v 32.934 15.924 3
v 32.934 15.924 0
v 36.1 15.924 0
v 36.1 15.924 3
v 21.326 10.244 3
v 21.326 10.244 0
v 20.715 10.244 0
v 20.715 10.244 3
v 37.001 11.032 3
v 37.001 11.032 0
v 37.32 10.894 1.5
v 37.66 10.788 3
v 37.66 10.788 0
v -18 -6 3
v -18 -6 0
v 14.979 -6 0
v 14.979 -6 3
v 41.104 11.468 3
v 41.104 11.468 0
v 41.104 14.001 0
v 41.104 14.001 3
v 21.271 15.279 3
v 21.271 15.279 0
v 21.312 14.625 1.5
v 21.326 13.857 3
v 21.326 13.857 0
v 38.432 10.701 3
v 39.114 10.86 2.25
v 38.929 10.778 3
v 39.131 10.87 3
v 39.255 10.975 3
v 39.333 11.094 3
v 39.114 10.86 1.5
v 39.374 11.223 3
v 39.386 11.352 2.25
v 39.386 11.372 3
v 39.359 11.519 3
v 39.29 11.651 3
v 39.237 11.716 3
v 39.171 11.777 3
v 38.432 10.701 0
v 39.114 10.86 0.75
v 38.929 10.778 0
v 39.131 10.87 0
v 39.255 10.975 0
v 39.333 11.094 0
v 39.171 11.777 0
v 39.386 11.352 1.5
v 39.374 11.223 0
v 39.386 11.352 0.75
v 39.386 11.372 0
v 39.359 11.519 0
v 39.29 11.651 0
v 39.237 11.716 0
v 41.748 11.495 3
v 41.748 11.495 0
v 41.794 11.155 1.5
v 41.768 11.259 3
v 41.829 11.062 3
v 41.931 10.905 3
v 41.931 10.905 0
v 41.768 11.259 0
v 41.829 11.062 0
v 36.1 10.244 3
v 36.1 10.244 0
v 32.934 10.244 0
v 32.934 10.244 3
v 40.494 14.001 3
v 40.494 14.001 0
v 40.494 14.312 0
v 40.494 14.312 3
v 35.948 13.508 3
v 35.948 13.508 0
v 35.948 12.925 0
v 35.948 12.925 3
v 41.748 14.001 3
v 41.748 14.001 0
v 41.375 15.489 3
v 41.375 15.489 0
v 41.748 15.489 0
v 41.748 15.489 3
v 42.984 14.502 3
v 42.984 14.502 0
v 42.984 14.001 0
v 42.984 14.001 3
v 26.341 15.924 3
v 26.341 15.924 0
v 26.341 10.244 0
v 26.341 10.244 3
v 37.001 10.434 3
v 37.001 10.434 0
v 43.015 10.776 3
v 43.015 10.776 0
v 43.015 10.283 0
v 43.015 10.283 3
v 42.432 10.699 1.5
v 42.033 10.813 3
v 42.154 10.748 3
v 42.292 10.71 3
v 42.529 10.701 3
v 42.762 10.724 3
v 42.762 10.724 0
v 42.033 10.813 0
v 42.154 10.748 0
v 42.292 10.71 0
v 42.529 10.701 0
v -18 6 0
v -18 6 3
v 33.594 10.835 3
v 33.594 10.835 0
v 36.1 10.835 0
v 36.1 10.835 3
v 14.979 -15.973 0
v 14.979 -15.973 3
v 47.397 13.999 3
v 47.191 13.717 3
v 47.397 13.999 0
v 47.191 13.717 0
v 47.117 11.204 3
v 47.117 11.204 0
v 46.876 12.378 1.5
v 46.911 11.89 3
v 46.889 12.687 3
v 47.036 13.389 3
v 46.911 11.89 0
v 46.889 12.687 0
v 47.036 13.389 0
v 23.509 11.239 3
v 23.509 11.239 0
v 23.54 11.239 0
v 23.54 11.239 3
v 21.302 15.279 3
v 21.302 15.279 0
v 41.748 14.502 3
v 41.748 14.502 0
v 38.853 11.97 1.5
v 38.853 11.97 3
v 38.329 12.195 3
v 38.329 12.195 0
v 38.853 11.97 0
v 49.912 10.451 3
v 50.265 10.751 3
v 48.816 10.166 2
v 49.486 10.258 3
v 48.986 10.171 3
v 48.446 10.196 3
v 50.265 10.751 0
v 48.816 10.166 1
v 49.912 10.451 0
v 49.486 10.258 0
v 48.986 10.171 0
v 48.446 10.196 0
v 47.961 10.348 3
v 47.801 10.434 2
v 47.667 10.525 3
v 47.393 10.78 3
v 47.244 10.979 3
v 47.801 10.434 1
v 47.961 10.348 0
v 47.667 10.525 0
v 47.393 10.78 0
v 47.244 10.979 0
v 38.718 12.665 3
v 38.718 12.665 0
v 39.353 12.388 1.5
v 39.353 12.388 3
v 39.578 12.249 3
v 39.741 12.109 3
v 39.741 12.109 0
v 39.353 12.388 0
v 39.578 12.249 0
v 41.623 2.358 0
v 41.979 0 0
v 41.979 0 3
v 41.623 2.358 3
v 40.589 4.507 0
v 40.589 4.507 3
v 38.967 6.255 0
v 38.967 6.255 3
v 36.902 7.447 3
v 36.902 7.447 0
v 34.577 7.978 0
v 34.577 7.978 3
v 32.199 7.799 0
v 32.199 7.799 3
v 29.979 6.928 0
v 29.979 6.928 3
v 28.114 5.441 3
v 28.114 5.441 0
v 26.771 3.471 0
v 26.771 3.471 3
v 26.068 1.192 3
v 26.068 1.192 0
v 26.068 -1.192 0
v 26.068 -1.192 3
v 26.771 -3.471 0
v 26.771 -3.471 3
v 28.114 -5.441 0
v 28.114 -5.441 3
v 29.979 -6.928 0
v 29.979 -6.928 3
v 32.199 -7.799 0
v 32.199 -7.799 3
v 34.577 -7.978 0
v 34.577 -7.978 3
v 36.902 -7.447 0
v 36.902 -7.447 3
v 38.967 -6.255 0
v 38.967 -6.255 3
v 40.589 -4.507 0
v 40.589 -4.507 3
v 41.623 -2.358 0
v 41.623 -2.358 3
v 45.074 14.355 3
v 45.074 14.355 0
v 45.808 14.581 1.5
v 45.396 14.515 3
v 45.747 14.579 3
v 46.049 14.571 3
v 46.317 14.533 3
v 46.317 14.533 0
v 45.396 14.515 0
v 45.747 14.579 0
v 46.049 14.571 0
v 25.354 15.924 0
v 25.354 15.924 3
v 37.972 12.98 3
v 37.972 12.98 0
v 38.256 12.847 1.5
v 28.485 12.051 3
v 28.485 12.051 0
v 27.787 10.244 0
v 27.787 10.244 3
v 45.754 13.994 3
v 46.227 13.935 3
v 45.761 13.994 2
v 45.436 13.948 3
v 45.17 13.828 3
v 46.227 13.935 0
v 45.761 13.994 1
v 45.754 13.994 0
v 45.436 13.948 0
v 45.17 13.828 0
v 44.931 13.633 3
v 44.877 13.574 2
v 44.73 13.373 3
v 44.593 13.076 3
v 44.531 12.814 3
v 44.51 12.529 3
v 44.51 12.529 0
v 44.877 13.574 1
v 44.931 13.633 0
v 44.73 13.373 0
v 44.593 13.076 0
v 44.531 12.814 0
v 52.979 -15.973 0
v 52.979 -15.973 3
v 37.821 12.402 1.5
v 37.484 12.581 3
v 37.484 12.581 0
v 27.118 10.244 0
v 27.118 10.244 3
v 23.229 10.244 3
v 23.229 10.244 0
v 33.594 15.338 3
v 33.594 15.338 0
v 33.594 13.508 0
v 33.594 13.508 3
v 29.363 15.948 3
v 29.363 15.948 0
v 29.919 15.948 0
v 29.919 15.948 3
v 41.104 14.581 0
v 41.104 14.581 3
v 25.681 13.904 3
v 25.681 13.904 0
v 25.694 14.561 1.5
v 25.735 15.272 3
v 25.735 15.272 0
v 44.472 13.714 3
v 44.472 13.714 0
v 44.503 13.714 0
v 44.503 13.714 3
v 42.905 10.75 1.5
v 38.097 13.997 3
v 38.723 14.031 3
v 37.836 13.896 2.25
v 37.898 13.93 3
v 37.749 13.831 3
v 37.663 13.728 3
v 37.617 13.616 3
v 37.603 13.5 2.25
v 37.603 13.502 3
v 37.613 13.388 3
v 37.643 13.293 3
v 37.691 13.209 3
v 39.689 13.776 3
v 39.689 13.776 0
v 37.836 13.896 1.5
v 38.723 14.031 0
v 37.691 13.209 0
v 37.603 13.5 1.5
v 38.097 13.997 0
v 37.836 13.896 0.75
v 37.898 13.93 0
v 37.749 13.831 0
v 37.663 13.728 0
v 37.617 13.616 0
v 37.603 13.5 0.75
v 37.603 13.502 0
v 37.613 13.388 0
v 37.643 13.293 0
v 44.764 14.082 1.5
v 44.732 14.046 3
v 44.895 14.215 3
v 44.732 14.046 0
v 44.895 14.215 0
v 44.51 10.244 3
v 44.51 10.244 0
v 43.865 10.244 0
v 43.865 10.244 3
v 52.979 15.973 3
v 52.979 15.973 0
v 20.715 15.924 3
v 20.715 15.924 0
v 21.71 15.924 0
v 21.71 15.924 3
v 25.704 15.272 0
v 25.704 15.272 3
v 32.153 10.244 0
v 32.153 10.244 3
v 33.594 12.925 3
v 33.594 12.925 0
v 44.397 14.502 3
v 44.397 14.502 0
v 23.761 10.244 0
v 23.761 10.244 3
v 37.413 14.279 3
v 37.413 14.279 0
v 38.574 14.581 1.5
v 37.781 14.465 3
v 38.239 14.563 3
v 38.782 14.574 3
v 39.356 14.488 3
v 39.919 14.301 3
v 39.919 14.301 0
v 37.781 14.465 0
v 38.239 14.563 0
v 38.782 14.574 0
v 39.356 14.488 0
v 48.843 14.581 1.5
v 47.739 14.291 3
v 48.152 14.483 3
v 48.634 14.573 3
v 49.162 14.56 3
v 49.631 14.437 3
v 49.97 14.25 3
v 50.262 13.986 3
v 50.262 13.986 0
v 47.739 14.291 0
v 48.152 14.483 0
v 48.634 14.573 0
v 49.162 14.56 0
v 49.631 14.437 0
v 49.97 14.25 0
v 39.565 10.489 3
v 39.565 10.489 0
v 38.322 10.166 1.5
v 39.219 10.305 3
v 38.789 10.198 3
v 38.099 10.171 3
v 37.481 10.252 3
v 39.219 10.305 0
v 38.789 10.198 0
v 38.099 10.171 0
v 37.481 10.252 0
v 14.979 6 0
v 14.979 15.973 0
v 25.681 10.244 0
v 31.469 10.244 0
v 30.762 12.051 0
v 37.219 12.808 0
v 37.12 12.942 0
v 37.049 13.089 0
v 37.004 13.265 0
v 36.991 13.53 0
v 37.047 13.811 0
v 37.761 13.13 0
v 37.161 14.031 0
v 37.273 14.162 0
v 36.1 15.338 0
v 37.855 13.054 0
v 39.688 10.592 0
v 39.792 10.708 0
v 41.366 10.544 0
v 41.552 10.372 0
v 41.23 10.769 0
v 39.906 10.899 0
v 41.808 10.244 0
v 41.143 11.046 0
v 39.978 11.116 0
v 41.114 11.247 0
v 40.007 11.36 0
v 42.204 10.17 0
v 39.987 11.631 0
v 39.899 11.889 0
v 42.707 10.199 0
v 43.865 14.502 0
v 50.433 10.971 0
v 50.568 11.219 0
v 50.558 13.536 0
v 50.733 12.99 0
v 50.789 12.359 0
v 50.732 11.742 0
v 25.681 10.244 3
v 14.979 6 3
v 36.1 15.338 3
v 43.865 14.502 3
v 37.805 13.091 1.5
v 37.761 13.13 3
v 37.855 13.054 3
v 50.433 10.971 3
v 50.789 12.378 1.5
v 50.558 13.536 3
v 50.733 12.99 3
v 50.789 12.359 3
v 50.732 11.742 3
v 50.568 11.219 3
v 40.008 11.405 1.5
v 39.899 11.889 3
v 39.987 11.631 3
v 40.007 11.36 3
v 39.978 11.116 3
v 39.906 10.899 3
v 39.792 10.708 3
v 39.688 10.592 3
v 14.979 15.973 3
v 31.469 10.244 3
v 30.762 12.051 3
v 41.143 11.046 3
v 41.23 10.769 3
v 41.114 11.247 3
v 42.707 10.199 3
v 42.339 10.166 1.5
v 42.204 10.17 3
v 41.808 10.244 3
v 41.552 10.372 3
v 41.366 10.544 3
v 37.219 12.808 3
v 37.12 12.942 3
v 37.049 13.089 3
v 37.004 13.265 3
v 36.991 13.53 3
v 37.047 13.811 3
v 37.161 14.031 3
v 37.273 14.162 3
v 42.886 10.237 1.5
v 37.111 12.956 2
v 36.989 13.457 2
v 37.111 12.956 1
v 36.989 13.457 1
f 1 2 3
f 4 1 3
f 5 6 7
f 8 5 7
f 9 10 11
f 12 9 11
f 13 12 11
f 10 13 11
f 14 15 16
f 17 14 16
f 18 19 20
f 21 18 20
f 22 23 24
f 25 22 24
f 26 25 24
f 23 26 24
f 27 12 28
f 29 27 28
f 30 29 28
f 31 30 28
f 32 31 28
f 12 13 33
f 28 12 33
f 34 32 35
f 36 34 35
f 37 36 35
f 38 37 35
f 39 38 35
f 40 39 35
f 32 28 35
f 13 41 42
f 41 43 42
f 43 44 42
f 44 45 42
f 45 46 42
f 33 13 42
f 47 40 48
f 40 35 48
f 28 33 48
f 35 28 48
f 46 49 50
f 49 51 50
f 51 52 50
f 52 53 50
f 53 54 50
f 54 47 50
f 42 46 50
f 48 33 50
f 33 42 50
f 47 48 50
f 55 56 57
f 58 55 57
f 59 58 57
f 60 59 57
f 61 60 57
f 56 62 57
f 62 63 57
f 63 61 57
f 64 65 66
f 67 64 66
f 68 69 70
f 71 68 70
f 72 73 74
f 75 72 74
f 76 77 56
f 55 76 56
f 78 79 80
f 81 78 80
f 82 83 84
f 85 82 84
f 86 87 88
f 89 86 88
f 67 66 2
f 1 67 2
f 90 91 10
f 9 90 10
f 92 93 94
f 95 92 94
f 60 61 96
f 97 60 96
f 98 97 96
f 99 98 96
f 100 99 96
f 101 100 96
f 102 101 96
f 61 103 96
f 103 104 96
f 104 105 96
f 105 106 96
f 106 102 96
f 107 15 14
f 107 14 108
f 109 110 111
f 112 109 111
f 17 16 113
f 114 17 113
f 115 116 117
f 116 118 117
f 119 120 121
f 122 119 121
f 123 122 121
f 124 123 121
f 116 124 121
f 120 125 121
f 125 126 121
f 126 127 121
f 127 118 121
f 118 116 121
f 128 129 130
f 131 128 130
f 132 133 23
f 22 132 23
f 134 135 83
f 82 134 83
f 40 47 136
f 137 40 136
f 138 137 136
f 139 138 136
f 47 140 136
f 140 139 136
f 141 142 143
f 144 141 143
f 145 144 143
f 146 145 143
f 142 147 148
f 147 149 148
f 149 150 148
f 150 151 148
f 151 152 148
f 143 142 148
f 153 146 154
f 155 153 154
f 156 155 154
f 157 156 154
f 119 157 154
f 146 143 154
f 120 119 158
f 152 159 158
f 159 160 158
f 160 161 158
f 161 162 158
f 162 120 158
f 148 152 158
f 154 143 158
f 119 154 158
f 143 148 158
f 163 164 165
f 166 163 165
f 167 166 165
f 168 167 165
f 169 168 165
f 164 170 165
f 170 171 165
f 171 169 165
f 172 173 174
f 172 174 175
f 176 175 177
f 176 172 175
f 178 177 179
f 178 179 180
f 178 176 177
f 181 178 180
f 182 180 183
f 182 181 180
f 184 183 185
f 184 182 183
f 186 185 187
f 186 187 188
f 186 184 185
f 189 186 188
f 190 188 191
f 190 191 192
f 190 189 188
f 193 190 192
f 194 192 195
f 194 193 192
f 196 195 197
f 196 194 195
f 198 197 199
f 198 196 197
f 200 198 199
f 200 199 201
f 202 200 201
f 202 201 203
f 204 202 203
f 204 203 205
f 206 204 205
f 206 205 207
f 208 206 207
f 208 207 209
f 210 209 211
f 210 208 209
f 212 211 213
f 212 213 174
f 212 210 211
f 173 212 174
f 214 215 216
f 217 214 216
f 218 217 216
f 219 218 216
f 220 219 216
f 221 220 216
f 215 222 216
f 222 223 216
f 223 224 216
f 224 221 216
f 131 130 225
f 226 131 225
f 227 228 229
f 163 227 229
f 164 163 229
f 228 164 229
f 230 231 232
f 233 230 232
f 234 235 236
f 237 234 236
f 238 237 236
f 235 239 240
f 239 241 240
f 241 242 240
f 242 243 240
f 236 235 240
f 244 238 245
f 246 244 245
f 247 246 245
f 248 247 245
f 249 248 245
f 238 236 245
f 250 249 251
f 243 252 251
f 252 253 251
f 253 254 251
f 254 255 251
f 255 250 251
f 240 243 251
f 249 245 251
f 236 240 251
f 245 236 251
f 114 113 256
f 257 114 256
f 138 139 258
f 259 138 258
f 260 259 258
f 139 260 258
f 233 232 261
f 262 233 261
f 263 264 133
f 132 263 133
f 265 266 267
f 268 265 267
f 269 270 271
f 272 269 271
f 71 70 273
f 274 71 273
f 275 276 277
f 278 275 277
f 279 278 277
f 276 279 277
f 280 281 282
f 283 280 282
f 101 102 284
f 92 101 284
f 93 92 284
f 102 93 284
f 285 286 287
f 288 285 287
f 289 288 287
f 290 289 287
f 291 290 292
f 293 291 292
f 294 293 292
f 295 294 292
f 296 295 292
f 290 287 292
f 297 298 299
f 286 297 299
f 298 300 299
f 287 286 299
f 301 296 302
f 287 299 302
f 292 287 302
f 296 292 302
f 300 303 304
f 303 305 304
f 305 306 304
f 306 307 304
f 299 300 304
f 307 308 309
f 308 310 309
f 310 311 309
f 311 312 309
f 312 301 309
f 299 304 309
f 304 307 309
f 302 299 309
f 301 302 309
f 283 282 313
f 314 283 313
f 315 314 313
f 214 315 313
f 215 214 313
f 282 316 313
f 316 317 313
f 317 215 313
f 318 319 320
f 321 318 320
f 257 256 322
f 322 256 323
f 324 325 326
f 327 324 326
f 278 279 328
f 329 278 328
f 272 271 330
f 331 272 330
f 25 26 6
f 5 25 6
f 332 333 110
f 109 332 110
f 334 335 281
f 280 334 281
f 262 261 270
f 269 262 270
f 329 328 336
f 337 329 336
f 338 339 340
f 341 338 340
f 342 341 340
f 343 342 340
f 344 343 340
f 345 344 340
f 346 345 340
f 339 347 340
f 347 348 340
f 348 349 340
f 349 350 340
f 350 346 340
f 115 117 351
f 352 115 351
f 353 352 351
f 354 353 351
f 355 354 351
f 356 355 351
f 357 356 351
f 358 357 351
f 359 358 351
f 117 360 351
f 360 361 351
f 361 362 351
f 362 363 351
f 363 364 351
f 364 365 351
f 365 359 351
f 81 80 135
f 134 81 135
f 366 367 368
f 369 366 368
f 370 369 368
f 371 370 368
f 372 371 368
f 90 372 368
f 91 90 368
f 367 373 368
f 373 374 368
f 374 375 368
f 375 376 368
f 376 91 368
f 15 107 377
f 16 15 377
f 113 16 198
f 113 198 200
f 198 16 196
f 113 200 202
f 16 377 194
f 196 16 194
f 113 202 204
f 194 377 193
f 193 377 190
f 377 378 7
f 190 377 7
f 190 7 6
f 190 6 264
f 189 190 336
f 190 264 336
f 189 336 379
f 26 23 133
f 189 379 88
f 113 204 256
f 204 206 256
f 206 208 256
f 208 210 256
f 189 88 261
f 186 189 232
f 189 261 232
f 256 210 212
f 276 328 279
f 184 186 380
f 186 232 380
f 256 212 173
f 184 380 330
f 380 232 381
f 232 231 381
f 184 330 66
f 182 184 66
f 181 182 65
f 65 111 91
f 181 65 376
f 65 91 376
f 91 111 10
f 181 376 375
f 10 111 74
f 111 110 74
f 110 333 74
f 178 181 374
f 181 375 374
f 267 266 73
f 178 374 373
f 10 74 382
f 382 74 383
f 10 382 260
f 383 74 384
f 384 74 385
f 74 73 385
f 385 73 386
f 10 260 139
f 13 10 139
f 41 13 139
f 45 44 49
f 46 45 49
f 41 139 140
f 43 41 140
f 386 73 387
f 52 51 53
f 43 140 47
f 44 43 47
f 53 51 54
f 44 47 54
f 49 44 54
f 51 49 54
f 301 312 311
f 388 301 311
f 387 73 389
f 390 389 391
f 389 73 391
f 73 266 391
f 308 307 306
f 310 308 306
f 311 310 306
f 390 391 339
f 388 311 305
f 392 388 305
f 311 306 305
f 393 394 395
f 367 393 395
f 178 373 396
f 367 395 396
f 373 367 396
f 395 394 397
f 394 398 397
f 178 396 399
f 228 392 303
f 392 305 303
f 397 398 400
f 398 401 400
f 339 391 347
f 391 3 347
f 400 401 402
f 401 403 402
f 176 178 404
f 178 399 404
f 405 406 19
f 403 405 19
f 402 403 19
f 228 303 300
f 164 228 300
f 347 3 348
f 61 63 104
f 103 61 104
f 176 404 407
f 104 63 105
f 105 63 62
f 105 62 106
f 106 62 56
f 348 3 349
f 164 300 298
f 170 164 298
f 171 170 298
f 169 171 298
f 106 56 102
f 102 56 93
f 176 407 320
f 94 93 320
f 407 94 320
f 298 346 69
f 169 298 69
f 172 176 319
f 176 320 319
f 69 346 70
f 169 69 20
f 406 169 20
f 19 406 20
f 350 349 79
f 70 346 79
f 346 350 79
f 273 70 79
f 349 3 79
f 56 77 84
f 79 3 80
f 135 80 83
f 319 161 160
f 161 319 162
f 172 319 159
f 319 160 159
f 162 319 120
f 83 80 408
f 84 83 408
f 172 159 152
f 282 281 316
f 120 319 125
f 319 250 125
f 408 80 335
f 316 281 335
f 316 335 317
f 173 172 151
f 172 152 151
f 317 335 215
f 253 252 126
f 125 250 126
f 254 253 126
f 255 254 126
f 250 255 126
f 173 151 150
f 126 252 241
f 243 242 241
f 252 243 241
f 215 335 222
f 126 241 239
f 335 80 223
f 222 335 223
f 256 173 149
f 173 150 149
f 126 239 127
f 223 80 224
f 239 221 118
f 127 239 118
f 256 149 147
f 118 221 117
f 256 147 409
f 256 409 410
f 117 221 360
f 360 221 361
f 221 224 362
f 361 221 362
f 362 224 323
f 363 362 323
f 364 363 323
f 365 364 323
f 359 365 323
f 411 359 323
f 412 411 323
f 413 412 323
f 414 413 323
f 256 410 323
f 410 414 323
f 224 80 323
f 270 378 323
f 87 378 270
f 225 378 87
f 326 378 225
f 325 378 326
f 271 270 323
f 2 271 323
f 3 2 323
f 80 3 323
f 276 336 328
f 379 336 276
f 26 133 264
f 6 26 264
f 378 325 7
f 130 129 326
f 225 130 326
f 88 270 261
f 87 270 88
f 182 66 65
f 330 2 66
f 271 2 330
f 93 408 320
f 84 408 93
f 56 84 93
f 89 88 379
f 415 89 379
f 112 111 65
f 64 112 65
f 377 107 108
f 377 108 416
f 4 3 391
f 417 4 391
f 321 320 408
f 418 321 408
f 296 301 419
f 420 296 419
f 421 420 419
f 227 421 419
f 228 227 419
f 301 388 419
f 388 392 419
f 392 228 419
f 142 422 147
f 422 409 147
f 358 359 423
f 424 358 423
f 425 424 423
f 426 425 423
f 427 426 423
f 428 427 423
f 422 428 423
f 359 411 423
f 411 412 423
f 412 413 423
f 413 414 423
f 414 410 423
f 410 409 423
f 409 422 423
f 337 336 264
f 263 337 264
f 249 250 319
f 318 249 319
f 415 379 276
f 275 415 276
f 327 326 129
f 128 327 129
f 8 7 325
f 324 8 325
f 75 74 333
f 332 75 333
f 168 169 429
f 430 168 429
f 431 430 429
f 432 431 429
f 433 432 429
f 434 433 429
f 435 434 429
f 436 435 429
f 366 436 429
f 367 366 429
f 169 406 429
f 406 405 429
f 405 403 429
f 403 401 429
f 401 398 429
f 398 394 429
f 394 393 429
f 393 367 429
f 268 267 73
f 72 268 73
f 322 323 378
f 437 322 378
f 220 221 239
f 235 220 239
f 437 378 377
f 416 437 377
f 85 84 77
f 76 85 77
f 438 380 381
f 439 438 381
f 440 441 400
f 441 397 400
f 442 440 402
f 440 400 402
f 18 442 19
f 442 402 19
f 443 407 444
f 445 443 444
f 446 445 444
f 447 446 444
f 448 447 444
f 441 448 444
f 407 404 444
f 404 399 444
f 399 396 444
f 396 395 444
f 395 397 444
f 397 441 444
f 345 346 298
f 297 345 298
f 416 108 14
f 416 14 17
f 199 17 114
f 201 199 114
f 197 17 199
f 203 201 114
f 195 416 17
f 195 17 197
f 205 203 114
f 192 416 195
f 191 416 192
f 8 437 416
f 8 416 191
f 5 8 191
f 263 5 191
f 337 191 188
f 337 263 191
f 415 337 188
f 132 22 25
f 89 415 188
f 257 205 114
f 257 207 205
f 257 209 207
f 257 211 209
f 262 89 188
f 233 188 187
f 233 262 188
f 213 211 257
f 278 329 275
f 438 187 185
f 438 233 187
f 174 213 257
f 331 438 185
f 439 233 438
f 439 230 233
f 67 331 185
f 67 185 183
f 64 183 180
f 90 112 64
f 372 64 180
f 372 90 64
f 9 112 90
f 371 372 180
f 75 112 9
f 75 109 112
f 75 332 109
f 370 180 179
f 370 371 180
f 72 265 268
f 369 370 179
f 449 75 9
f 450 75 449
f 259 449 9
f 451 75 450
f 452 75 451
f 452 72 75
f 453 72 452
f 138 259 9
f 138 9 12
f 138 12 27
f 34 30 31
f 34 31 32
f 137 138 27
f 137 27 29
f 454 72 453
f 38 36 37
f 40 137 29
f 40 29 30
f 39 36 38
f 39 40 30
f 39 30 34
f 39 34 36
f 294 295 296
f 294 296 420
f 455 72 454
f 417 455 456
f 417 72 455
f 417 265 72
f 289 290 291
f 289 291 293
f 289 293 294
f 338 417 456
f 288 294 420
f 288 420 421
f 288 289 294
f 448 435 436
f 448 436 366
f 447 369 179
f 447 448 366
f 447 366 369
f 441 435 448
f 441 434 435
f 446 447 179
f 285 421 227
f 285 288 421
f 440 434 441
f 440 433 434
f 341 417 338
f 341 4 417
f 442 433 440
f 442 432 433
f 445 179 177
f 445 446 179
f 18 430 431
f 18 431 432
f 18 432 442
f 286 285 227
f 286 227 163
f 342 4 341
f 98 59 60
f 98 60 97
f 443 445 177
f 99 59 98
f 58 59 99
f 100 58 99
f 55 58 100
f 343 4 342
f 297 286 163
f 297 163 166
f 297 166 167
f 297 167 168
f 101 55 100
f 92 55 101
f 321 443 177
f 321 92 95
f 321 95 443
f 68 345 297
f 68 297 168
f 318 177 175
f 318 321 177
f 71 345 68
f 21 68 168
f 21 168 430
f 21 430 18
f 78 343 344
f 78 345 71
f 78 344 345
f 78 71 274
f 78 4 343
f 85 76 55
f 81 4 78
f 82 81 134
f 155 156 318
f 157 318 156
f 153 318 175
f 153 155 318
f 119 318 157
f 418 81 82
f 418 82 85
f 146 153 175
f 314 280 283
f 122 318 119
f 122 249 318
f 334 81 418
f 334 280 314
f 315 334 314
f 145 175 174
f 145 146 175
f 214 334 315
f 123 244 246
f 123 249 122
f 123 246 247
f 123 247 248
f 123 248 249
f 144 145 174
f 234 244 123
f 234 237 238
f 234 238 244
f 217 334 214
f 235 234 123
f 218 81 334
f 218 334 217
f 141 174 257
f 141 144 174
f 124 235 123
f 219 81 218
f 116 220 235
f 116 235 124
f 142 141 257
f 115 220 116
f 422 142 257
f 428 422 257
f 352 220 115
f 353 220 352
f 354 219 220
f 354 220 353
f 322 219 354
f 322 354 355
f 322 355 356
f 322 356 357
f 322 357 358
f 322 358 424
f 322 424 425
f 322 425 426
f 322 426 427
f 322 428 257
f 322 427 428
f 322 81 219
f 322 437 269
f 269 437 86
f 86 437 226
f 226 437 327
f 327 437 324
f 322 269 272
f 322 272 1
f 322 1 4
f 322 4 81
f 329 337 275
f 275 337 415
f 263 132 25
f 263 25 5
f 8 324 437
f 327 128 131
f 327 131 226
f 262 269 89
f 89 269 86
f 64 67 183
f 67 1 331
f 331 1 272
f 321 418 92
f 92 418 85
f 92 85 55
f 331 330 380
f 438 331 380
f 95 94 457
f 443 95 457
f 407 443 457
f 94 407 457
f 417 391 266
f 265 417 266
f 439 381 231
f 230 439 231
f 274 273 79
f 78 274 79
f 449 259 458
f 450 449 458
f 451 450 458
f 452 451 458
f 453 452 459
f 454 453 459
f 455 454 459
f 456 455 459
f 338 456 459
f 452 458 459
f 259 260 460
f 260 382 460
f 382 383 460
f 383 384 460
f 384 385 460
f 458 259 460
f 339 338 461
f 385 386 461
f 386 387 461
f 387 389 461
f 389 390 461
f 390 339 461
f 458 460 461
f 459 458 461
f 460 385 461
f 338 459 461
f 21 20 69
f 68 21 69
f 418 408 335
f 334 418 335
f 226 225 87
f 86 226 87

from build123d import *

# Parameters (mm, degrees)
F0_R     = 8
F0_W     = 3.0211615264
F0_H     = 12
F0_W_2   = 32.9788384736
F1_DEPTH = 3


with BuildPart() as f1:
    # F0 (on Top) → F1 (new body)
    with BuildSketch(Plane.XY):
        Polygon((14.9788384736, 6), (18, 6), (18, -6), (14.9788384736, -6), (14.9788384736, -15.9729579464), (52.9788384736, -15.9729579464), (52.9788384736, 15.9729579464), (14.9788384736, 15.9729579464), align=None)
        with Locations((33.9788384736, 0)):
            Circle(F0_R, mode=Mode.SUBTRACT)
        with BuildLine():
            Line((23.7611867672, 10.2442298084), (23.2290913585, 10.2442298084))
            Line((23.2290913585, 10.2442298084), (21.3021103226, 15.2792447734))
            Line((21.3021103226, 15.2792447734), (21.2710299833, 15.2792447734))
            add(Edge.make_bspline(
                [(21.2710299833, 15.2792447734), (21.3257313804, 14.6812590455), (21.3257313804, 13.8570084475)],
                knots=[0, 0, 0, 1, 1, 1], degree=2))
            Line((21.3257313804, 13.8570084475), (21.3257313804, 10.2442298084))
            Line((21.3257313804, 10.2442298084), (20.7153135168, 10.2442298084))
            Line((20.7153135168, 10.2442298084), (20.7153135168, 15.9244726171))
            Line((20.7153135168, 15.9244726171), (21.709884374, 15.9244726171))
            Line((21.709884374, 15.9244726171), (23.5088144121, 11.2388006657))
            Line((23.5088144121, 11.2388006657), (23.5398947514, 11.2388006657))
            Line((23.5398947514, 11.2388006657), (25.3537433524, 15.9244726171))
            Line((25.3537433524, 15.9244726171), (26.3408549282, 15.9244726171))
            Line((26.3408549282, 15.9244726171), (26.3408549282, 10.2442298084))
            Line((26.3408549282, 10.2442298084), (25.6807085217, 10.2442298084))
            Line((25.6807085217, 10.2442298084), (25.6807085217, 13.9042505632))
            add(Edge.make_bspline(
                [(25.6807085217, 13.9042505632), (25.6807085217, 14.5333166305), (25.7354099189, 15.271785492)],
                knots=[0, 0, 0, 1, 1, 1], degree=2))
            Line((25.7354099189, 15.271785492), (25.7043295796, 15.271785492))
            Line((25.7043295796, 15.271785492), (23.7611867672, 10.2442298084))
        make_face(mode=Mode.SUBTRACT)
        Polygon((32.1528783754, 10.2442298084), (31.4691109111, 10.2442298084), (30.7617223888, 12.050619128), (28.4853983392, 12.050619128), (27.786712312, 10.2442298084), (27.1178634105, 10.2442298084), (29.3631071208, 15.9480936749), (29.9188235873, 15.9480936749), align=None, mode=Mode.SUBTRACT)
        Polygon((36.1000814652, 10.834756255), (36.1000814652, 10.2442298084), (32.9336164984, 10.2442298084), (32.9336164984, 15.9244726171), (36.1000814652, 15.9244726171), (36.1000814652, 15.3376758113), (33.5937629049, 15.3376758113), (33.5937629049, 13.5076654339), (35.9484094095, 13.5076654339), (35.9484094095, 12.9245982688), (33.5937629049, 12.9245982688), (33.5937629049, 10.834756255), align=None, mode=Mode.SUBTRACT)
        with BuildLine():
            add(Edge.make_bspline(
                [(39.7414540164, 12.1090501658), (40.0075017208, 11.8293271122), (40.0075017208, 11.4053912843)],
                knots=[0, 0, 0, 1, 1, 1], degree=2))
            add(Edge.make_bspline(
                [(40.0075017208, 11.4053912843), (40.0075017208, 10.8111351971), (39.5649176893, 10.4885212753)],
                knots=[0, 0, 0, 1, 1, 1], degree=2))
            add(Edge.make_bspline(
                [(39.5649176893, 10.4885212753), (39.1223336578, 10.1659073534), (38.3217041177, 10.1659073534)],
                knots=[0, 0, 0, 1, 1, 1], degree=2))
            add(Edge.make_bspline(
                [(38.3217041177, 10.1659073534), (37.4750756754, 10.1659073534), (37.0014113047, 10.4344414849)],
                knots=[0, 0, 0, 1, 1, 1], degree=2))
            Line((37.0014113047, 10.4344414849), (37.0014113047, 11.0324272128))
            add(Edge.make_bspline(
                [(37.0014113047, 11.0324272128), (37.3084850568, 10.8770255164), (37.6596928908, 10.788135746)],
                knots=[0, 0, 0, 1, 1, 1], degree=2))
            add(Edge.make_bspline(
                [(37.6596928908, 10.788135746), (38.0109007248, 10.6992459757), (38.3378658941, 10.6992459757)],
                knots=[0, 0, 0, 1, 1, 1], degree=2))
            add(Edge.make_bspline(
                [(38.3378658941, 10.6992459757), (38.8426106042, 10.6992459757), (39.1142527696, 10.8602421332)],
                knots=[0, 0, 0, 1, 1, 1], degree=2))
            add(Edge.make_bspline(
                [(39.1142527696, 10.8602421332), (39.385894935, 11.0212382907), (39.385894935, 11.3519331007)],
                knots=[0, 0, 0, 1, 1, 1], degree=2))
            add(Edge.make_bspline(
                [(39.385894935, 11.3519331007), (39.385894935, 11.6005758151), (39.1708189871, 11.7771121422)],
                knots=[0, 0, 0, 1, 1, 1], degree=2))
            add(Edge.make_bspline(
                [(39.1708189871, 11.7771121422), (38.9557430392, 11.9536484694), (38.3291633991, 12.1948319023)],
                knots=[0, 0, 0, 1, 1, 1], degree=2))
            add(Edge.make_bspline(
                [(38.3291633991, 12.1948319023), (37.7349073119, 12.416123918), (37.4843997772, 12.581471323)],
                knots=[0, 0, 0, 1, 1, 1], degree=2))
            add(Edge.make_bspline(
                [(37.4843997772, 12.581471323), (37.2338922425, 12.7468187281), (37.1114357057, 12.9563002149)],
                knots=[0, 0, 0, 1, 1, 1], degree=2))
            add(Edge.make_bspline(
                [(37.1114357057, 12.9563002149), (36.9889791689, 13.1657817017), (36.9889791689, 13.4566936775)],
                knots=[0, 0, 0, 1, 1, 1], degree=2))
            add(Edge.make_bspline(
                [(36.9889791689, 13.4566936775), (36.9889791689, 13.9776001639), (37.4129149969, 14.2790794551)],
                knots=[0, 0, 0, 1, 1, 1], degree=2))
            add(Edge.make_bspline(
                [(37.4129149969, 14.2790794551), (37.8368508248, 14.5805587462), (38.5740764727, 14.5805587462)],
                knots=[0, 0, 0, 1, 1, 1], degree=2))
            add(Edge.make_bspline(
                [(38.5740764727, 14.5805587462), (39.2615735778, 14.5805587462), (39.9192335572, 14.3008356926)],
                knots=[0, 0, 0, 1, 1, 1], degree=2))
            Line((39.9192335572, 14.3008356926), (39.6892390464, 13.7761995654))
            add(Edge.make_bspline(
                [(39.6892390464, 13.7761995654), (39.0489840571, 14.0397608425), (38.5280775706, 14.0397608425)],
                knots=[0, 0, 0, 1, 1, 1], degree=2))
            add(Edge.make_bspline(
                [(38.5280775706, 14.0397608425), (38.0693317627, 14.0397608425), (37.836229218, 13.896169675)],
                knots=[0, 0, 0, 1, 1, 1], degree=2))
            add(Edge.make_bspline(
                [(37.836229218, 13.896169675), (37.6031266733, 13.7525785075), (37.6031266733, 13.5002061525)],
                knots=[0, 0, 0, 1, 1, 1], degree=2))
            add(Edge.make_bspline(
                [(37.6031266733, 13.5002061525), (37.6031266733, 13.3286426796), (37.6907732301, 13.2086725699)],
                knots=[0, 0, 0, 1, 1, 1], degree=2))
            add(Edge.make_bspline(
                [(37.6907732301, 13.2086725699), (37.7784197869, 13.0887024603), (37.9723611041, 12.9799212727)],
                knots=[0, 0, 0, 1, 1, 1], degree=2))
            add(Edge.make_bspline(
                [(37.9723611041, 12.9799212727), (38.1663024212, 12.8711400852), (38.718289247, 12.6647666323)],
                knots=[0, 0, 0, 1, 1, 1], degree=2))
            add(Edge.make_bspline(
                [(38.718289247, 12.6647666323), (39.4754063121, 12.3887732195), (39.7414540164, 12.1090501658)],
                knots=[0, 0, 0, 1, 1, 1], degree=2))
        make_face(mode=Mode.SUBTRACT)
        with BuildLine():
            add(Edge.make_bspline(
                [(41.930753116, 10.9049978218), (42.1135055111, 10.6992459757), (42.4317681854, 10.6992459757)],
                knots=[0, 0, 0, 1, 1, 1], degree=2))
            add(Edge.make_bspline(
                [(42.4317681854, 10.6992459757), (42.6033316583, 10.6992459757), (42.7624629954, 10.7241102471)],
                knots=[0, 0, 0, 1, 1, 1], degree=2))
            add(Edge.make_bspline(
                [(42.7624629954, 10.7241102471), (42.9215943326, 10.7489745185), (43.0148353505, 10.7763252171)],
                knots=[0, 0, 0, 1, 1, 1], degree=2))
            Line((43.0148353505, 10.7763252171), (43.0148353505, 10.2827694292))
            add(Edge.make_bspline(
                [(43.0148353505, 10.2827694292), (42.9104054104, 10.2330408863), (42.7065183847, 10.1994741199)],
                knots=[0, 0, 0, 1, 1, 1], degree=2))
            add(Edge.make_bspline(
                [(42.7065183847, 10.1994741199), (42.502631359, 10.1659073534), (42.3385271675, 10.1659073534)],
                knots=[0, 0, 0, 1, 1, 1], degree=2))
            add(Edge.make_bspline(
                [(42.3385271675, 10.1659073534), (41.1040160909, 10.1659073534), (41.1040160909, 11.4675519629)],
                knots=[0, 0, 0, 1, 1, 1], degree=2))
            Line((41.1040160909, 11.4675519629), (41.1040160909, 14.0012212218))
            Line((41.1040160909, 14.0012212218), (40.4935982273, 14.0012212218))
            Line((40.4935982273, 14.0012212218), (40.4935982273, 14.3120246147))
            Line((40.4935982273, 14.3120246147), (41.1040160909, 14.5805587462))
            Line((41.1040160909, 14.5805587462), (41.3750366495, 15.489347867))
            Line((41.3750366495, 15.489347867), (41.748000721, 15.489347867))
            Line((41.748000721, 15.489347867), (41.748000721, 14.5022362912))
            Line((41.748000721, 14.5022362912), (42.9837550112, 14.5022362912))
            Line((42.9837550112, 14.5022362912), (42.9837550112, 14.0012212218))
            Line((42.9837550112, 14.0012212218), (41.748000721, 14.0012212218))
            Line((41.748000721, 14.0012212218), (41.748000721, 11.4949026615))
            add(Edge.make_bspline(
                [(41.748000721, 11.4949026615), (41.748000721, 11.1107496679), (41.930753116, 10.9049978218)],
                knots=[0, 0, 0, 1, 1, 1], degree=2))
        make_face(mode=Mode.SUBTRACT)
        with BuildLine():
            add(Edge.make_bspline(
                [(45.073597025, 14.3549154829), (45.4080214758, 14.5805587462), (45.8083362458, 14.5805587462)],
                knots=[0, 0, 0, 1, 1, 1], degree=2))
            add(Edge.make_bspline(
                [(45.8083362458, 14.5805587462), (46.0917889402, 14.5805587462), (46.3168105966, 14.5333166305)],
                knots=[0, 0, 0, 1, 1, 1], degree=2))
            Line((46.3168105966, 14.5333166305), (46.2272992195, 13.9353309025))
            add(Edge.make_bspline(
                [(46.2272992195, 13.9353309025), (45.9637379423, 13.9937619404), (45.7610941301, 13.9937619404)],
                knots=[0, 0, 0, 1, 1, 1], degree=2))
            add(Edge.make_bspline(
                [(45.7610941301, 13.9937619404), (45.2439172843, 13.9937619404), (44.8771692807, 13.57417736)],
                knots=[0, 0, 0, 1, 1, 1], degree=2))
            add(Edge.make_bspline(
                [(44.8771692807, 13.57417736), (44.5104212771, 13.1545927796), (44.5104212771, 12.529256353)],
                knots=[0, 0, 0, 1, 1, 1], degree=2))
            Line((44.5104212771, 12.529256353), (44.5104212771, 10.2442298084))
            Line((44.5104212771, 10.2442298084), (43.8651934334, 10.2442298084))
            Line((43.8651934334, 10.2442298084), (43.8651934334, 14.5022362912))
            Line((43.8651934334, 14.5022362912), (44.3972888421, 14.5022362912))
            Line((44.3972888421, 14.5022362912), (44.4718816564, 13.7140388868))
            Line((44.4718816564, 13.7140388868), (44.5029619957, 13.7140388868))
            add(Edge.make_bspline(
                [(44.5029619957, 13.7140388868), (44.7391725743, 14.1292722197), (45.073597025, 14.3549154829)],
                knots=[0, 0, 0, 1, 1, 1], degree=2))
        make_face(mode=Mode.SUBTRACT)
        with BuildLine():
            add(Edge.make_bspline(
                [(50.2621488661, 13.9856810522), (50.7886498136, 13.3908033582), (50.7886498136, 12.3775842973)],
                knots=[0, 0, 0, 1, 1, 1], degree=2))
            add(Edge.make_bspline(
                [(50.7886498136, 12.3775842973), (50.7886498136, 11.3357713243), (50.2646352932, 10.7508393389)],
                knots=[0, 0, 0, 1, 1, 1], degree=2))
            add(Edge.make_bspline(
                [(50.2646352932, 10.7508393389), (49.7406207728, 10.1659073534), (48.8156698755, 10.1659073534)],
                knots=[0, 0, 0, 1, 1, 1], degree=2))
            add(Edge.make_bspline(
                [(48.8156698755, 10.1659073534), (48.2437916326, 10.1659073534), (47.8012076011, 10.4344414849)],
                knots=[0, 0, 0, 1, 1, 1], degree=2))
            add(Edge.make_bspline(
                [(47.8012076011, 10.4344414849), (47.3586235696, 10.7029756164), (47.1174401367, 11.2039906857)],
                knots=[0, 0, 0, 1, 1, 1], degree=2))
            add(Edge.make_bspline(
                [(47.1174401367, 11.2039906857), (46.8762567038, 11.7050057551), (46.8762567038, 12.3775842973)],
                knots=[0, 0, 0, 1, 1, 1], degree=2))
            add(Edge.make_bspline(
                [(46.8762567038, 12.3775842973), (46.8762567038, 13.4181540567), (47.3971631903, 13.9993564015)],
                knots=[0, 0, 0, 1, 1, 1], degree=2))
            add(Edge.make_bspline(
                [(47.3971631903, 13.9993564015), (47.9180696768, 14.5805587462), (48.8430205741, 14.5805587462)],
                knots=[0, 0, 0, 1, 1, 1], degree=2))
            add(Edge.make_bspline(
                [(48.8430205741, 14.5805587462), (49.7356479185, 14.5805587462), (50.2621488661, 13.9856810522)],
                knots=[0, 0, 0, 1, 1, 1], degree=2))
        make_face(mode=Mode.SUBTRACT)
        with Locations((16.4894192368, 0)):
            Rectangle(F0_W, F0_H)
        with Locations((-1.5105807632, 0)):
            Rectangle(F0_W_2, F0_H)
    extrude(amount=F1_DEPTH)


solid = f1.part
